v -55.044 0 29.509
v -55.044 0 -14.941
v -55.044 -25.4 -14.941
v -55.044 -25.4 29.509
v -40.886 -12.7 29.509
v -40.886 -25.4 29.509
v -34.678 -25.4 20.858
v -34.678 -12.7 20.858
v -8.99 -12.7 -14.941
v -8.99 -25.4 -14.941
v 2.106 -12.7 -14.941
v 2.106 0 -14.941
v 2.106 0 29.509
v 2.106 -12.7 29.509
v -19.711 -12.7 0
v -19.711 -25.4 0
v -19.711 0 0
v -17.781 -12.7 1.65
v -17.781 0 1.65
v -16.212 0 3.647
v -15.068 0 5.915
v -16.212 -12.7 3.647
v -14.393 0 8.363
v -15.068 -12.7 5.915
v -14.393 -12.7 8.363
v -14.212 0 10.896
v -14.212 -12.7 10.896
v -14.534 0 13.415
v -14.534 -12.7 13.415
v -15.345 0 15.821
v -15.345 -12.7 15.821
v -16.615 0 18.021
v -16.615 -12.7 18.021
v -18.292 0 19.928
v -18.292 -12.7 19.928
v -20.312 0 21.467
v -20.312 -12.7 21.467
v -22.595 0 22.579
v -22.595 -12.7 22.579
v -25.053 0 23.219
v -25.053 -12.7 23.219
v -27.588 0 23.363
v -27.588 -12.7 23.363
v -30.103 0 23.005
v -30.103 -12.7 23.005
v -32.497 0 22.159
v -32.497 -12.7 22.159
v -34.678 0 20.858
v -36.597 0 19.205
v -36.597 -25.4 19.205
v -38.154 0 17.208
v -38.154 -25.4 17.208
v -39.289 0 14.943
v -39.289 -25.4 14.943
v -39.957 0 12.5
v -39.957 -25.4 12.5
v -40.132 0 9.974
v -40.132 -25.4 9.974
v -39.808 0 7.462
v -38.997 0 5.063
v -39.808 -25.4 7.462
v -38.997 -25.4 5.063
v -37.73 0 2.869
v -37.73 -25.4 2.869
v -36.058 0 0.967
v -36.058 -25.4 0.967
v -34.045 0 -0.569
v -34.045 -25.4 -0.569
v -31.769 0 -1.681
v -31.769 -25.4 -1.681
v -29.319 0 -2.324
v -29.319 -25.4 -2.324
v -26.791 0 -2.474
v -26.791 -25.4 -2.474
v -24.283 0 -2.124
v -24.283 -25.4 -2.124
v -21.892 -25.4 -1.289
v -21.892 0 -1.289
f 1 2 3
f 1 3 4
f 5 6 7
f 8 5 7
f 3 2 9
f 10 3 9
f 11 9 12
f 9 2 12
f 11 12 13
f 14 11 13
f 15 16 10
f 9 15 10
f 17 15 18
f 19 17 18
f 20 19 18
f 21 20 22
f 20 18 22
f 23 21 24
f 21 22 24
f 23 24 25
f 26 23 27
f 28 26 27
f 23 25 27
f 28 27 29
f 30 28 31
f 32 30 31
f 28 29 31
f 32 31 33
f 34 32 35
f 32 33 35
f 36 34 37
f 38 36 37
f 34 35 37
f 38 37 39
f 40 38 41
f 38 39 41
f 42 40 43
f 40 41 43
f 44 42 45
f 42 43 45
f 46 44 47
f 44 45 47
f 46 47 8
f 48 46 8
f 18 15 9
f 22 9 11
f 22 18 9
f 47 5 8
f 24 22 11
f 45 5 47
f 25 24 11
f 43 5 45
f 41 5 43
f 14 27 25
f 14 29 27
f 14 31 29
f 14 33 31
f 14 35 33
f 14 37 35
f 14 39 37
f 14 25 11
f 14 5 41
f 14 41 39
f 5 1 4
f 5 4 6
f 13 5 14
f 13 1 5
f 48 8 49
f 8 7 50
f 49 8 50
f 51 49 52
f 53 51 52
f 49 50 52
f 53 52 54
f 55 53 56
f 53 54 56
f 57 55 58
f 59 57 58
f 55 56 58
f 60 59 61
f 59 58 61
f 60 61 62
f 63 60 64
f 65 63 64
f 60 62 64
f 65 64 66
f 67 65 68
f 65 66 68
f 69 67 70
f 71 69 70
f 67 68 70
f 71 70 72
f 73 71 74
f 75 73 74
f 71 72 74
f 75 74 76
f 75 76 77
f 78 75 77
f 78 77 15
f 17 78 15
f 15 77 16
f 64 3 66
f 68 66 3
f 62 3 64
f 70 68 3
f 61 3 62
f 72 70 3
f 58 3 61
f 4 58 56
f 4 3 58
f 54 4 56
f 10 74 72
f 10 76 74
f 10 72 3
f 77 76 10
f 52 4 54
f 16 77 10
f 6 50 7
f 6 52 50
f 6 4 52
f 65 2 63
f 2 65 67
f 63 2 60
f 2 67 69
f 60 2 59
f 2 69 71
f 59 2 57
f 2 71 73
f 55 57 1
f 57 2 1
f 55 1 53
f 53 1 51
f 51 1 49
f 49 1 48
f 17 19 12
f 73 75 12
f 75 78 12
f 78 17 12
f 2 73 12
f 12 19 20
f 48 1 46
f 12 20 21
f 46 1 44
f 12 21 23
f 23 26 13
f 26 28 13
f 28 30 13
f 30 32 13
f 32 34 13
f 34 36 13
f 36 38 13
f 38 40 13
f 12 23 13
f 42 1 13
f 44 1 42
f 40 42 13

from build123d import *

# Parameters (mm, degrees)
F0_W     = 57.15
F0_H     = 44.45
F1_DEPTH = 25.4
F3_DEPTH = 12.7
F5_DEPTH = 25.401
F7_DEPTH = 25.4


with BuildPart() as f1:
    # F0 (on Front) → F1 (new body)
    with BuildSketch(Plane.XZ):
        with Locations((-26.4685656875, 7.2840715903)):
            Rectangle(F0_W, F0_H)
    extrude(amount=F1_DEPTH)

    # F2 (on face) → F3 (cut)
    with BuildSketch(Plane.XZ.offset(25.4)):
        Polygon((2.1064343125, 29.5090715903), (-40.8858768642, 29.5090715903), (-8.9903669432, -14.9409284097), (2.1064343125, -14.9409284097), align=None)
    extrude(amount=-F3_DEPTH, mode=Mode.SUBTRACT)

    # F4 (on face) → F5 (cut, through all)
    with BuildSketch(Plane.XZ.offset(25.4)):
        with BuildLine():
            Line((-19.7113687501, 0), (-34.6783755455, 20.8582165233))
            ThreePointArc((-34.6783755455, 20.8582165233), (-37.7301963147, 2.8693886556), (-19.7113687501, 0))
        make_face()
    extrude(amount=-F5_DEPTH, mode=Mode.SUBTRACT)

    # F6 (on face) → F7 (cut)
    with BuildSketch(Plane.XZ.offset(12.7)):
        with BuildLine():
            Line((-34.6783755455, 20.8582165233), (-19.7113687501, 0))
            ThreePointArc((-19.7113687501, 0), (-16.6145780918, 18.0210964288), (-34.6783755455, 20.8582165233))
        make_face()
    extrude(amount=-F7_DEPTH, mode=Mode.SUBTRACT)


solid = f1.part
